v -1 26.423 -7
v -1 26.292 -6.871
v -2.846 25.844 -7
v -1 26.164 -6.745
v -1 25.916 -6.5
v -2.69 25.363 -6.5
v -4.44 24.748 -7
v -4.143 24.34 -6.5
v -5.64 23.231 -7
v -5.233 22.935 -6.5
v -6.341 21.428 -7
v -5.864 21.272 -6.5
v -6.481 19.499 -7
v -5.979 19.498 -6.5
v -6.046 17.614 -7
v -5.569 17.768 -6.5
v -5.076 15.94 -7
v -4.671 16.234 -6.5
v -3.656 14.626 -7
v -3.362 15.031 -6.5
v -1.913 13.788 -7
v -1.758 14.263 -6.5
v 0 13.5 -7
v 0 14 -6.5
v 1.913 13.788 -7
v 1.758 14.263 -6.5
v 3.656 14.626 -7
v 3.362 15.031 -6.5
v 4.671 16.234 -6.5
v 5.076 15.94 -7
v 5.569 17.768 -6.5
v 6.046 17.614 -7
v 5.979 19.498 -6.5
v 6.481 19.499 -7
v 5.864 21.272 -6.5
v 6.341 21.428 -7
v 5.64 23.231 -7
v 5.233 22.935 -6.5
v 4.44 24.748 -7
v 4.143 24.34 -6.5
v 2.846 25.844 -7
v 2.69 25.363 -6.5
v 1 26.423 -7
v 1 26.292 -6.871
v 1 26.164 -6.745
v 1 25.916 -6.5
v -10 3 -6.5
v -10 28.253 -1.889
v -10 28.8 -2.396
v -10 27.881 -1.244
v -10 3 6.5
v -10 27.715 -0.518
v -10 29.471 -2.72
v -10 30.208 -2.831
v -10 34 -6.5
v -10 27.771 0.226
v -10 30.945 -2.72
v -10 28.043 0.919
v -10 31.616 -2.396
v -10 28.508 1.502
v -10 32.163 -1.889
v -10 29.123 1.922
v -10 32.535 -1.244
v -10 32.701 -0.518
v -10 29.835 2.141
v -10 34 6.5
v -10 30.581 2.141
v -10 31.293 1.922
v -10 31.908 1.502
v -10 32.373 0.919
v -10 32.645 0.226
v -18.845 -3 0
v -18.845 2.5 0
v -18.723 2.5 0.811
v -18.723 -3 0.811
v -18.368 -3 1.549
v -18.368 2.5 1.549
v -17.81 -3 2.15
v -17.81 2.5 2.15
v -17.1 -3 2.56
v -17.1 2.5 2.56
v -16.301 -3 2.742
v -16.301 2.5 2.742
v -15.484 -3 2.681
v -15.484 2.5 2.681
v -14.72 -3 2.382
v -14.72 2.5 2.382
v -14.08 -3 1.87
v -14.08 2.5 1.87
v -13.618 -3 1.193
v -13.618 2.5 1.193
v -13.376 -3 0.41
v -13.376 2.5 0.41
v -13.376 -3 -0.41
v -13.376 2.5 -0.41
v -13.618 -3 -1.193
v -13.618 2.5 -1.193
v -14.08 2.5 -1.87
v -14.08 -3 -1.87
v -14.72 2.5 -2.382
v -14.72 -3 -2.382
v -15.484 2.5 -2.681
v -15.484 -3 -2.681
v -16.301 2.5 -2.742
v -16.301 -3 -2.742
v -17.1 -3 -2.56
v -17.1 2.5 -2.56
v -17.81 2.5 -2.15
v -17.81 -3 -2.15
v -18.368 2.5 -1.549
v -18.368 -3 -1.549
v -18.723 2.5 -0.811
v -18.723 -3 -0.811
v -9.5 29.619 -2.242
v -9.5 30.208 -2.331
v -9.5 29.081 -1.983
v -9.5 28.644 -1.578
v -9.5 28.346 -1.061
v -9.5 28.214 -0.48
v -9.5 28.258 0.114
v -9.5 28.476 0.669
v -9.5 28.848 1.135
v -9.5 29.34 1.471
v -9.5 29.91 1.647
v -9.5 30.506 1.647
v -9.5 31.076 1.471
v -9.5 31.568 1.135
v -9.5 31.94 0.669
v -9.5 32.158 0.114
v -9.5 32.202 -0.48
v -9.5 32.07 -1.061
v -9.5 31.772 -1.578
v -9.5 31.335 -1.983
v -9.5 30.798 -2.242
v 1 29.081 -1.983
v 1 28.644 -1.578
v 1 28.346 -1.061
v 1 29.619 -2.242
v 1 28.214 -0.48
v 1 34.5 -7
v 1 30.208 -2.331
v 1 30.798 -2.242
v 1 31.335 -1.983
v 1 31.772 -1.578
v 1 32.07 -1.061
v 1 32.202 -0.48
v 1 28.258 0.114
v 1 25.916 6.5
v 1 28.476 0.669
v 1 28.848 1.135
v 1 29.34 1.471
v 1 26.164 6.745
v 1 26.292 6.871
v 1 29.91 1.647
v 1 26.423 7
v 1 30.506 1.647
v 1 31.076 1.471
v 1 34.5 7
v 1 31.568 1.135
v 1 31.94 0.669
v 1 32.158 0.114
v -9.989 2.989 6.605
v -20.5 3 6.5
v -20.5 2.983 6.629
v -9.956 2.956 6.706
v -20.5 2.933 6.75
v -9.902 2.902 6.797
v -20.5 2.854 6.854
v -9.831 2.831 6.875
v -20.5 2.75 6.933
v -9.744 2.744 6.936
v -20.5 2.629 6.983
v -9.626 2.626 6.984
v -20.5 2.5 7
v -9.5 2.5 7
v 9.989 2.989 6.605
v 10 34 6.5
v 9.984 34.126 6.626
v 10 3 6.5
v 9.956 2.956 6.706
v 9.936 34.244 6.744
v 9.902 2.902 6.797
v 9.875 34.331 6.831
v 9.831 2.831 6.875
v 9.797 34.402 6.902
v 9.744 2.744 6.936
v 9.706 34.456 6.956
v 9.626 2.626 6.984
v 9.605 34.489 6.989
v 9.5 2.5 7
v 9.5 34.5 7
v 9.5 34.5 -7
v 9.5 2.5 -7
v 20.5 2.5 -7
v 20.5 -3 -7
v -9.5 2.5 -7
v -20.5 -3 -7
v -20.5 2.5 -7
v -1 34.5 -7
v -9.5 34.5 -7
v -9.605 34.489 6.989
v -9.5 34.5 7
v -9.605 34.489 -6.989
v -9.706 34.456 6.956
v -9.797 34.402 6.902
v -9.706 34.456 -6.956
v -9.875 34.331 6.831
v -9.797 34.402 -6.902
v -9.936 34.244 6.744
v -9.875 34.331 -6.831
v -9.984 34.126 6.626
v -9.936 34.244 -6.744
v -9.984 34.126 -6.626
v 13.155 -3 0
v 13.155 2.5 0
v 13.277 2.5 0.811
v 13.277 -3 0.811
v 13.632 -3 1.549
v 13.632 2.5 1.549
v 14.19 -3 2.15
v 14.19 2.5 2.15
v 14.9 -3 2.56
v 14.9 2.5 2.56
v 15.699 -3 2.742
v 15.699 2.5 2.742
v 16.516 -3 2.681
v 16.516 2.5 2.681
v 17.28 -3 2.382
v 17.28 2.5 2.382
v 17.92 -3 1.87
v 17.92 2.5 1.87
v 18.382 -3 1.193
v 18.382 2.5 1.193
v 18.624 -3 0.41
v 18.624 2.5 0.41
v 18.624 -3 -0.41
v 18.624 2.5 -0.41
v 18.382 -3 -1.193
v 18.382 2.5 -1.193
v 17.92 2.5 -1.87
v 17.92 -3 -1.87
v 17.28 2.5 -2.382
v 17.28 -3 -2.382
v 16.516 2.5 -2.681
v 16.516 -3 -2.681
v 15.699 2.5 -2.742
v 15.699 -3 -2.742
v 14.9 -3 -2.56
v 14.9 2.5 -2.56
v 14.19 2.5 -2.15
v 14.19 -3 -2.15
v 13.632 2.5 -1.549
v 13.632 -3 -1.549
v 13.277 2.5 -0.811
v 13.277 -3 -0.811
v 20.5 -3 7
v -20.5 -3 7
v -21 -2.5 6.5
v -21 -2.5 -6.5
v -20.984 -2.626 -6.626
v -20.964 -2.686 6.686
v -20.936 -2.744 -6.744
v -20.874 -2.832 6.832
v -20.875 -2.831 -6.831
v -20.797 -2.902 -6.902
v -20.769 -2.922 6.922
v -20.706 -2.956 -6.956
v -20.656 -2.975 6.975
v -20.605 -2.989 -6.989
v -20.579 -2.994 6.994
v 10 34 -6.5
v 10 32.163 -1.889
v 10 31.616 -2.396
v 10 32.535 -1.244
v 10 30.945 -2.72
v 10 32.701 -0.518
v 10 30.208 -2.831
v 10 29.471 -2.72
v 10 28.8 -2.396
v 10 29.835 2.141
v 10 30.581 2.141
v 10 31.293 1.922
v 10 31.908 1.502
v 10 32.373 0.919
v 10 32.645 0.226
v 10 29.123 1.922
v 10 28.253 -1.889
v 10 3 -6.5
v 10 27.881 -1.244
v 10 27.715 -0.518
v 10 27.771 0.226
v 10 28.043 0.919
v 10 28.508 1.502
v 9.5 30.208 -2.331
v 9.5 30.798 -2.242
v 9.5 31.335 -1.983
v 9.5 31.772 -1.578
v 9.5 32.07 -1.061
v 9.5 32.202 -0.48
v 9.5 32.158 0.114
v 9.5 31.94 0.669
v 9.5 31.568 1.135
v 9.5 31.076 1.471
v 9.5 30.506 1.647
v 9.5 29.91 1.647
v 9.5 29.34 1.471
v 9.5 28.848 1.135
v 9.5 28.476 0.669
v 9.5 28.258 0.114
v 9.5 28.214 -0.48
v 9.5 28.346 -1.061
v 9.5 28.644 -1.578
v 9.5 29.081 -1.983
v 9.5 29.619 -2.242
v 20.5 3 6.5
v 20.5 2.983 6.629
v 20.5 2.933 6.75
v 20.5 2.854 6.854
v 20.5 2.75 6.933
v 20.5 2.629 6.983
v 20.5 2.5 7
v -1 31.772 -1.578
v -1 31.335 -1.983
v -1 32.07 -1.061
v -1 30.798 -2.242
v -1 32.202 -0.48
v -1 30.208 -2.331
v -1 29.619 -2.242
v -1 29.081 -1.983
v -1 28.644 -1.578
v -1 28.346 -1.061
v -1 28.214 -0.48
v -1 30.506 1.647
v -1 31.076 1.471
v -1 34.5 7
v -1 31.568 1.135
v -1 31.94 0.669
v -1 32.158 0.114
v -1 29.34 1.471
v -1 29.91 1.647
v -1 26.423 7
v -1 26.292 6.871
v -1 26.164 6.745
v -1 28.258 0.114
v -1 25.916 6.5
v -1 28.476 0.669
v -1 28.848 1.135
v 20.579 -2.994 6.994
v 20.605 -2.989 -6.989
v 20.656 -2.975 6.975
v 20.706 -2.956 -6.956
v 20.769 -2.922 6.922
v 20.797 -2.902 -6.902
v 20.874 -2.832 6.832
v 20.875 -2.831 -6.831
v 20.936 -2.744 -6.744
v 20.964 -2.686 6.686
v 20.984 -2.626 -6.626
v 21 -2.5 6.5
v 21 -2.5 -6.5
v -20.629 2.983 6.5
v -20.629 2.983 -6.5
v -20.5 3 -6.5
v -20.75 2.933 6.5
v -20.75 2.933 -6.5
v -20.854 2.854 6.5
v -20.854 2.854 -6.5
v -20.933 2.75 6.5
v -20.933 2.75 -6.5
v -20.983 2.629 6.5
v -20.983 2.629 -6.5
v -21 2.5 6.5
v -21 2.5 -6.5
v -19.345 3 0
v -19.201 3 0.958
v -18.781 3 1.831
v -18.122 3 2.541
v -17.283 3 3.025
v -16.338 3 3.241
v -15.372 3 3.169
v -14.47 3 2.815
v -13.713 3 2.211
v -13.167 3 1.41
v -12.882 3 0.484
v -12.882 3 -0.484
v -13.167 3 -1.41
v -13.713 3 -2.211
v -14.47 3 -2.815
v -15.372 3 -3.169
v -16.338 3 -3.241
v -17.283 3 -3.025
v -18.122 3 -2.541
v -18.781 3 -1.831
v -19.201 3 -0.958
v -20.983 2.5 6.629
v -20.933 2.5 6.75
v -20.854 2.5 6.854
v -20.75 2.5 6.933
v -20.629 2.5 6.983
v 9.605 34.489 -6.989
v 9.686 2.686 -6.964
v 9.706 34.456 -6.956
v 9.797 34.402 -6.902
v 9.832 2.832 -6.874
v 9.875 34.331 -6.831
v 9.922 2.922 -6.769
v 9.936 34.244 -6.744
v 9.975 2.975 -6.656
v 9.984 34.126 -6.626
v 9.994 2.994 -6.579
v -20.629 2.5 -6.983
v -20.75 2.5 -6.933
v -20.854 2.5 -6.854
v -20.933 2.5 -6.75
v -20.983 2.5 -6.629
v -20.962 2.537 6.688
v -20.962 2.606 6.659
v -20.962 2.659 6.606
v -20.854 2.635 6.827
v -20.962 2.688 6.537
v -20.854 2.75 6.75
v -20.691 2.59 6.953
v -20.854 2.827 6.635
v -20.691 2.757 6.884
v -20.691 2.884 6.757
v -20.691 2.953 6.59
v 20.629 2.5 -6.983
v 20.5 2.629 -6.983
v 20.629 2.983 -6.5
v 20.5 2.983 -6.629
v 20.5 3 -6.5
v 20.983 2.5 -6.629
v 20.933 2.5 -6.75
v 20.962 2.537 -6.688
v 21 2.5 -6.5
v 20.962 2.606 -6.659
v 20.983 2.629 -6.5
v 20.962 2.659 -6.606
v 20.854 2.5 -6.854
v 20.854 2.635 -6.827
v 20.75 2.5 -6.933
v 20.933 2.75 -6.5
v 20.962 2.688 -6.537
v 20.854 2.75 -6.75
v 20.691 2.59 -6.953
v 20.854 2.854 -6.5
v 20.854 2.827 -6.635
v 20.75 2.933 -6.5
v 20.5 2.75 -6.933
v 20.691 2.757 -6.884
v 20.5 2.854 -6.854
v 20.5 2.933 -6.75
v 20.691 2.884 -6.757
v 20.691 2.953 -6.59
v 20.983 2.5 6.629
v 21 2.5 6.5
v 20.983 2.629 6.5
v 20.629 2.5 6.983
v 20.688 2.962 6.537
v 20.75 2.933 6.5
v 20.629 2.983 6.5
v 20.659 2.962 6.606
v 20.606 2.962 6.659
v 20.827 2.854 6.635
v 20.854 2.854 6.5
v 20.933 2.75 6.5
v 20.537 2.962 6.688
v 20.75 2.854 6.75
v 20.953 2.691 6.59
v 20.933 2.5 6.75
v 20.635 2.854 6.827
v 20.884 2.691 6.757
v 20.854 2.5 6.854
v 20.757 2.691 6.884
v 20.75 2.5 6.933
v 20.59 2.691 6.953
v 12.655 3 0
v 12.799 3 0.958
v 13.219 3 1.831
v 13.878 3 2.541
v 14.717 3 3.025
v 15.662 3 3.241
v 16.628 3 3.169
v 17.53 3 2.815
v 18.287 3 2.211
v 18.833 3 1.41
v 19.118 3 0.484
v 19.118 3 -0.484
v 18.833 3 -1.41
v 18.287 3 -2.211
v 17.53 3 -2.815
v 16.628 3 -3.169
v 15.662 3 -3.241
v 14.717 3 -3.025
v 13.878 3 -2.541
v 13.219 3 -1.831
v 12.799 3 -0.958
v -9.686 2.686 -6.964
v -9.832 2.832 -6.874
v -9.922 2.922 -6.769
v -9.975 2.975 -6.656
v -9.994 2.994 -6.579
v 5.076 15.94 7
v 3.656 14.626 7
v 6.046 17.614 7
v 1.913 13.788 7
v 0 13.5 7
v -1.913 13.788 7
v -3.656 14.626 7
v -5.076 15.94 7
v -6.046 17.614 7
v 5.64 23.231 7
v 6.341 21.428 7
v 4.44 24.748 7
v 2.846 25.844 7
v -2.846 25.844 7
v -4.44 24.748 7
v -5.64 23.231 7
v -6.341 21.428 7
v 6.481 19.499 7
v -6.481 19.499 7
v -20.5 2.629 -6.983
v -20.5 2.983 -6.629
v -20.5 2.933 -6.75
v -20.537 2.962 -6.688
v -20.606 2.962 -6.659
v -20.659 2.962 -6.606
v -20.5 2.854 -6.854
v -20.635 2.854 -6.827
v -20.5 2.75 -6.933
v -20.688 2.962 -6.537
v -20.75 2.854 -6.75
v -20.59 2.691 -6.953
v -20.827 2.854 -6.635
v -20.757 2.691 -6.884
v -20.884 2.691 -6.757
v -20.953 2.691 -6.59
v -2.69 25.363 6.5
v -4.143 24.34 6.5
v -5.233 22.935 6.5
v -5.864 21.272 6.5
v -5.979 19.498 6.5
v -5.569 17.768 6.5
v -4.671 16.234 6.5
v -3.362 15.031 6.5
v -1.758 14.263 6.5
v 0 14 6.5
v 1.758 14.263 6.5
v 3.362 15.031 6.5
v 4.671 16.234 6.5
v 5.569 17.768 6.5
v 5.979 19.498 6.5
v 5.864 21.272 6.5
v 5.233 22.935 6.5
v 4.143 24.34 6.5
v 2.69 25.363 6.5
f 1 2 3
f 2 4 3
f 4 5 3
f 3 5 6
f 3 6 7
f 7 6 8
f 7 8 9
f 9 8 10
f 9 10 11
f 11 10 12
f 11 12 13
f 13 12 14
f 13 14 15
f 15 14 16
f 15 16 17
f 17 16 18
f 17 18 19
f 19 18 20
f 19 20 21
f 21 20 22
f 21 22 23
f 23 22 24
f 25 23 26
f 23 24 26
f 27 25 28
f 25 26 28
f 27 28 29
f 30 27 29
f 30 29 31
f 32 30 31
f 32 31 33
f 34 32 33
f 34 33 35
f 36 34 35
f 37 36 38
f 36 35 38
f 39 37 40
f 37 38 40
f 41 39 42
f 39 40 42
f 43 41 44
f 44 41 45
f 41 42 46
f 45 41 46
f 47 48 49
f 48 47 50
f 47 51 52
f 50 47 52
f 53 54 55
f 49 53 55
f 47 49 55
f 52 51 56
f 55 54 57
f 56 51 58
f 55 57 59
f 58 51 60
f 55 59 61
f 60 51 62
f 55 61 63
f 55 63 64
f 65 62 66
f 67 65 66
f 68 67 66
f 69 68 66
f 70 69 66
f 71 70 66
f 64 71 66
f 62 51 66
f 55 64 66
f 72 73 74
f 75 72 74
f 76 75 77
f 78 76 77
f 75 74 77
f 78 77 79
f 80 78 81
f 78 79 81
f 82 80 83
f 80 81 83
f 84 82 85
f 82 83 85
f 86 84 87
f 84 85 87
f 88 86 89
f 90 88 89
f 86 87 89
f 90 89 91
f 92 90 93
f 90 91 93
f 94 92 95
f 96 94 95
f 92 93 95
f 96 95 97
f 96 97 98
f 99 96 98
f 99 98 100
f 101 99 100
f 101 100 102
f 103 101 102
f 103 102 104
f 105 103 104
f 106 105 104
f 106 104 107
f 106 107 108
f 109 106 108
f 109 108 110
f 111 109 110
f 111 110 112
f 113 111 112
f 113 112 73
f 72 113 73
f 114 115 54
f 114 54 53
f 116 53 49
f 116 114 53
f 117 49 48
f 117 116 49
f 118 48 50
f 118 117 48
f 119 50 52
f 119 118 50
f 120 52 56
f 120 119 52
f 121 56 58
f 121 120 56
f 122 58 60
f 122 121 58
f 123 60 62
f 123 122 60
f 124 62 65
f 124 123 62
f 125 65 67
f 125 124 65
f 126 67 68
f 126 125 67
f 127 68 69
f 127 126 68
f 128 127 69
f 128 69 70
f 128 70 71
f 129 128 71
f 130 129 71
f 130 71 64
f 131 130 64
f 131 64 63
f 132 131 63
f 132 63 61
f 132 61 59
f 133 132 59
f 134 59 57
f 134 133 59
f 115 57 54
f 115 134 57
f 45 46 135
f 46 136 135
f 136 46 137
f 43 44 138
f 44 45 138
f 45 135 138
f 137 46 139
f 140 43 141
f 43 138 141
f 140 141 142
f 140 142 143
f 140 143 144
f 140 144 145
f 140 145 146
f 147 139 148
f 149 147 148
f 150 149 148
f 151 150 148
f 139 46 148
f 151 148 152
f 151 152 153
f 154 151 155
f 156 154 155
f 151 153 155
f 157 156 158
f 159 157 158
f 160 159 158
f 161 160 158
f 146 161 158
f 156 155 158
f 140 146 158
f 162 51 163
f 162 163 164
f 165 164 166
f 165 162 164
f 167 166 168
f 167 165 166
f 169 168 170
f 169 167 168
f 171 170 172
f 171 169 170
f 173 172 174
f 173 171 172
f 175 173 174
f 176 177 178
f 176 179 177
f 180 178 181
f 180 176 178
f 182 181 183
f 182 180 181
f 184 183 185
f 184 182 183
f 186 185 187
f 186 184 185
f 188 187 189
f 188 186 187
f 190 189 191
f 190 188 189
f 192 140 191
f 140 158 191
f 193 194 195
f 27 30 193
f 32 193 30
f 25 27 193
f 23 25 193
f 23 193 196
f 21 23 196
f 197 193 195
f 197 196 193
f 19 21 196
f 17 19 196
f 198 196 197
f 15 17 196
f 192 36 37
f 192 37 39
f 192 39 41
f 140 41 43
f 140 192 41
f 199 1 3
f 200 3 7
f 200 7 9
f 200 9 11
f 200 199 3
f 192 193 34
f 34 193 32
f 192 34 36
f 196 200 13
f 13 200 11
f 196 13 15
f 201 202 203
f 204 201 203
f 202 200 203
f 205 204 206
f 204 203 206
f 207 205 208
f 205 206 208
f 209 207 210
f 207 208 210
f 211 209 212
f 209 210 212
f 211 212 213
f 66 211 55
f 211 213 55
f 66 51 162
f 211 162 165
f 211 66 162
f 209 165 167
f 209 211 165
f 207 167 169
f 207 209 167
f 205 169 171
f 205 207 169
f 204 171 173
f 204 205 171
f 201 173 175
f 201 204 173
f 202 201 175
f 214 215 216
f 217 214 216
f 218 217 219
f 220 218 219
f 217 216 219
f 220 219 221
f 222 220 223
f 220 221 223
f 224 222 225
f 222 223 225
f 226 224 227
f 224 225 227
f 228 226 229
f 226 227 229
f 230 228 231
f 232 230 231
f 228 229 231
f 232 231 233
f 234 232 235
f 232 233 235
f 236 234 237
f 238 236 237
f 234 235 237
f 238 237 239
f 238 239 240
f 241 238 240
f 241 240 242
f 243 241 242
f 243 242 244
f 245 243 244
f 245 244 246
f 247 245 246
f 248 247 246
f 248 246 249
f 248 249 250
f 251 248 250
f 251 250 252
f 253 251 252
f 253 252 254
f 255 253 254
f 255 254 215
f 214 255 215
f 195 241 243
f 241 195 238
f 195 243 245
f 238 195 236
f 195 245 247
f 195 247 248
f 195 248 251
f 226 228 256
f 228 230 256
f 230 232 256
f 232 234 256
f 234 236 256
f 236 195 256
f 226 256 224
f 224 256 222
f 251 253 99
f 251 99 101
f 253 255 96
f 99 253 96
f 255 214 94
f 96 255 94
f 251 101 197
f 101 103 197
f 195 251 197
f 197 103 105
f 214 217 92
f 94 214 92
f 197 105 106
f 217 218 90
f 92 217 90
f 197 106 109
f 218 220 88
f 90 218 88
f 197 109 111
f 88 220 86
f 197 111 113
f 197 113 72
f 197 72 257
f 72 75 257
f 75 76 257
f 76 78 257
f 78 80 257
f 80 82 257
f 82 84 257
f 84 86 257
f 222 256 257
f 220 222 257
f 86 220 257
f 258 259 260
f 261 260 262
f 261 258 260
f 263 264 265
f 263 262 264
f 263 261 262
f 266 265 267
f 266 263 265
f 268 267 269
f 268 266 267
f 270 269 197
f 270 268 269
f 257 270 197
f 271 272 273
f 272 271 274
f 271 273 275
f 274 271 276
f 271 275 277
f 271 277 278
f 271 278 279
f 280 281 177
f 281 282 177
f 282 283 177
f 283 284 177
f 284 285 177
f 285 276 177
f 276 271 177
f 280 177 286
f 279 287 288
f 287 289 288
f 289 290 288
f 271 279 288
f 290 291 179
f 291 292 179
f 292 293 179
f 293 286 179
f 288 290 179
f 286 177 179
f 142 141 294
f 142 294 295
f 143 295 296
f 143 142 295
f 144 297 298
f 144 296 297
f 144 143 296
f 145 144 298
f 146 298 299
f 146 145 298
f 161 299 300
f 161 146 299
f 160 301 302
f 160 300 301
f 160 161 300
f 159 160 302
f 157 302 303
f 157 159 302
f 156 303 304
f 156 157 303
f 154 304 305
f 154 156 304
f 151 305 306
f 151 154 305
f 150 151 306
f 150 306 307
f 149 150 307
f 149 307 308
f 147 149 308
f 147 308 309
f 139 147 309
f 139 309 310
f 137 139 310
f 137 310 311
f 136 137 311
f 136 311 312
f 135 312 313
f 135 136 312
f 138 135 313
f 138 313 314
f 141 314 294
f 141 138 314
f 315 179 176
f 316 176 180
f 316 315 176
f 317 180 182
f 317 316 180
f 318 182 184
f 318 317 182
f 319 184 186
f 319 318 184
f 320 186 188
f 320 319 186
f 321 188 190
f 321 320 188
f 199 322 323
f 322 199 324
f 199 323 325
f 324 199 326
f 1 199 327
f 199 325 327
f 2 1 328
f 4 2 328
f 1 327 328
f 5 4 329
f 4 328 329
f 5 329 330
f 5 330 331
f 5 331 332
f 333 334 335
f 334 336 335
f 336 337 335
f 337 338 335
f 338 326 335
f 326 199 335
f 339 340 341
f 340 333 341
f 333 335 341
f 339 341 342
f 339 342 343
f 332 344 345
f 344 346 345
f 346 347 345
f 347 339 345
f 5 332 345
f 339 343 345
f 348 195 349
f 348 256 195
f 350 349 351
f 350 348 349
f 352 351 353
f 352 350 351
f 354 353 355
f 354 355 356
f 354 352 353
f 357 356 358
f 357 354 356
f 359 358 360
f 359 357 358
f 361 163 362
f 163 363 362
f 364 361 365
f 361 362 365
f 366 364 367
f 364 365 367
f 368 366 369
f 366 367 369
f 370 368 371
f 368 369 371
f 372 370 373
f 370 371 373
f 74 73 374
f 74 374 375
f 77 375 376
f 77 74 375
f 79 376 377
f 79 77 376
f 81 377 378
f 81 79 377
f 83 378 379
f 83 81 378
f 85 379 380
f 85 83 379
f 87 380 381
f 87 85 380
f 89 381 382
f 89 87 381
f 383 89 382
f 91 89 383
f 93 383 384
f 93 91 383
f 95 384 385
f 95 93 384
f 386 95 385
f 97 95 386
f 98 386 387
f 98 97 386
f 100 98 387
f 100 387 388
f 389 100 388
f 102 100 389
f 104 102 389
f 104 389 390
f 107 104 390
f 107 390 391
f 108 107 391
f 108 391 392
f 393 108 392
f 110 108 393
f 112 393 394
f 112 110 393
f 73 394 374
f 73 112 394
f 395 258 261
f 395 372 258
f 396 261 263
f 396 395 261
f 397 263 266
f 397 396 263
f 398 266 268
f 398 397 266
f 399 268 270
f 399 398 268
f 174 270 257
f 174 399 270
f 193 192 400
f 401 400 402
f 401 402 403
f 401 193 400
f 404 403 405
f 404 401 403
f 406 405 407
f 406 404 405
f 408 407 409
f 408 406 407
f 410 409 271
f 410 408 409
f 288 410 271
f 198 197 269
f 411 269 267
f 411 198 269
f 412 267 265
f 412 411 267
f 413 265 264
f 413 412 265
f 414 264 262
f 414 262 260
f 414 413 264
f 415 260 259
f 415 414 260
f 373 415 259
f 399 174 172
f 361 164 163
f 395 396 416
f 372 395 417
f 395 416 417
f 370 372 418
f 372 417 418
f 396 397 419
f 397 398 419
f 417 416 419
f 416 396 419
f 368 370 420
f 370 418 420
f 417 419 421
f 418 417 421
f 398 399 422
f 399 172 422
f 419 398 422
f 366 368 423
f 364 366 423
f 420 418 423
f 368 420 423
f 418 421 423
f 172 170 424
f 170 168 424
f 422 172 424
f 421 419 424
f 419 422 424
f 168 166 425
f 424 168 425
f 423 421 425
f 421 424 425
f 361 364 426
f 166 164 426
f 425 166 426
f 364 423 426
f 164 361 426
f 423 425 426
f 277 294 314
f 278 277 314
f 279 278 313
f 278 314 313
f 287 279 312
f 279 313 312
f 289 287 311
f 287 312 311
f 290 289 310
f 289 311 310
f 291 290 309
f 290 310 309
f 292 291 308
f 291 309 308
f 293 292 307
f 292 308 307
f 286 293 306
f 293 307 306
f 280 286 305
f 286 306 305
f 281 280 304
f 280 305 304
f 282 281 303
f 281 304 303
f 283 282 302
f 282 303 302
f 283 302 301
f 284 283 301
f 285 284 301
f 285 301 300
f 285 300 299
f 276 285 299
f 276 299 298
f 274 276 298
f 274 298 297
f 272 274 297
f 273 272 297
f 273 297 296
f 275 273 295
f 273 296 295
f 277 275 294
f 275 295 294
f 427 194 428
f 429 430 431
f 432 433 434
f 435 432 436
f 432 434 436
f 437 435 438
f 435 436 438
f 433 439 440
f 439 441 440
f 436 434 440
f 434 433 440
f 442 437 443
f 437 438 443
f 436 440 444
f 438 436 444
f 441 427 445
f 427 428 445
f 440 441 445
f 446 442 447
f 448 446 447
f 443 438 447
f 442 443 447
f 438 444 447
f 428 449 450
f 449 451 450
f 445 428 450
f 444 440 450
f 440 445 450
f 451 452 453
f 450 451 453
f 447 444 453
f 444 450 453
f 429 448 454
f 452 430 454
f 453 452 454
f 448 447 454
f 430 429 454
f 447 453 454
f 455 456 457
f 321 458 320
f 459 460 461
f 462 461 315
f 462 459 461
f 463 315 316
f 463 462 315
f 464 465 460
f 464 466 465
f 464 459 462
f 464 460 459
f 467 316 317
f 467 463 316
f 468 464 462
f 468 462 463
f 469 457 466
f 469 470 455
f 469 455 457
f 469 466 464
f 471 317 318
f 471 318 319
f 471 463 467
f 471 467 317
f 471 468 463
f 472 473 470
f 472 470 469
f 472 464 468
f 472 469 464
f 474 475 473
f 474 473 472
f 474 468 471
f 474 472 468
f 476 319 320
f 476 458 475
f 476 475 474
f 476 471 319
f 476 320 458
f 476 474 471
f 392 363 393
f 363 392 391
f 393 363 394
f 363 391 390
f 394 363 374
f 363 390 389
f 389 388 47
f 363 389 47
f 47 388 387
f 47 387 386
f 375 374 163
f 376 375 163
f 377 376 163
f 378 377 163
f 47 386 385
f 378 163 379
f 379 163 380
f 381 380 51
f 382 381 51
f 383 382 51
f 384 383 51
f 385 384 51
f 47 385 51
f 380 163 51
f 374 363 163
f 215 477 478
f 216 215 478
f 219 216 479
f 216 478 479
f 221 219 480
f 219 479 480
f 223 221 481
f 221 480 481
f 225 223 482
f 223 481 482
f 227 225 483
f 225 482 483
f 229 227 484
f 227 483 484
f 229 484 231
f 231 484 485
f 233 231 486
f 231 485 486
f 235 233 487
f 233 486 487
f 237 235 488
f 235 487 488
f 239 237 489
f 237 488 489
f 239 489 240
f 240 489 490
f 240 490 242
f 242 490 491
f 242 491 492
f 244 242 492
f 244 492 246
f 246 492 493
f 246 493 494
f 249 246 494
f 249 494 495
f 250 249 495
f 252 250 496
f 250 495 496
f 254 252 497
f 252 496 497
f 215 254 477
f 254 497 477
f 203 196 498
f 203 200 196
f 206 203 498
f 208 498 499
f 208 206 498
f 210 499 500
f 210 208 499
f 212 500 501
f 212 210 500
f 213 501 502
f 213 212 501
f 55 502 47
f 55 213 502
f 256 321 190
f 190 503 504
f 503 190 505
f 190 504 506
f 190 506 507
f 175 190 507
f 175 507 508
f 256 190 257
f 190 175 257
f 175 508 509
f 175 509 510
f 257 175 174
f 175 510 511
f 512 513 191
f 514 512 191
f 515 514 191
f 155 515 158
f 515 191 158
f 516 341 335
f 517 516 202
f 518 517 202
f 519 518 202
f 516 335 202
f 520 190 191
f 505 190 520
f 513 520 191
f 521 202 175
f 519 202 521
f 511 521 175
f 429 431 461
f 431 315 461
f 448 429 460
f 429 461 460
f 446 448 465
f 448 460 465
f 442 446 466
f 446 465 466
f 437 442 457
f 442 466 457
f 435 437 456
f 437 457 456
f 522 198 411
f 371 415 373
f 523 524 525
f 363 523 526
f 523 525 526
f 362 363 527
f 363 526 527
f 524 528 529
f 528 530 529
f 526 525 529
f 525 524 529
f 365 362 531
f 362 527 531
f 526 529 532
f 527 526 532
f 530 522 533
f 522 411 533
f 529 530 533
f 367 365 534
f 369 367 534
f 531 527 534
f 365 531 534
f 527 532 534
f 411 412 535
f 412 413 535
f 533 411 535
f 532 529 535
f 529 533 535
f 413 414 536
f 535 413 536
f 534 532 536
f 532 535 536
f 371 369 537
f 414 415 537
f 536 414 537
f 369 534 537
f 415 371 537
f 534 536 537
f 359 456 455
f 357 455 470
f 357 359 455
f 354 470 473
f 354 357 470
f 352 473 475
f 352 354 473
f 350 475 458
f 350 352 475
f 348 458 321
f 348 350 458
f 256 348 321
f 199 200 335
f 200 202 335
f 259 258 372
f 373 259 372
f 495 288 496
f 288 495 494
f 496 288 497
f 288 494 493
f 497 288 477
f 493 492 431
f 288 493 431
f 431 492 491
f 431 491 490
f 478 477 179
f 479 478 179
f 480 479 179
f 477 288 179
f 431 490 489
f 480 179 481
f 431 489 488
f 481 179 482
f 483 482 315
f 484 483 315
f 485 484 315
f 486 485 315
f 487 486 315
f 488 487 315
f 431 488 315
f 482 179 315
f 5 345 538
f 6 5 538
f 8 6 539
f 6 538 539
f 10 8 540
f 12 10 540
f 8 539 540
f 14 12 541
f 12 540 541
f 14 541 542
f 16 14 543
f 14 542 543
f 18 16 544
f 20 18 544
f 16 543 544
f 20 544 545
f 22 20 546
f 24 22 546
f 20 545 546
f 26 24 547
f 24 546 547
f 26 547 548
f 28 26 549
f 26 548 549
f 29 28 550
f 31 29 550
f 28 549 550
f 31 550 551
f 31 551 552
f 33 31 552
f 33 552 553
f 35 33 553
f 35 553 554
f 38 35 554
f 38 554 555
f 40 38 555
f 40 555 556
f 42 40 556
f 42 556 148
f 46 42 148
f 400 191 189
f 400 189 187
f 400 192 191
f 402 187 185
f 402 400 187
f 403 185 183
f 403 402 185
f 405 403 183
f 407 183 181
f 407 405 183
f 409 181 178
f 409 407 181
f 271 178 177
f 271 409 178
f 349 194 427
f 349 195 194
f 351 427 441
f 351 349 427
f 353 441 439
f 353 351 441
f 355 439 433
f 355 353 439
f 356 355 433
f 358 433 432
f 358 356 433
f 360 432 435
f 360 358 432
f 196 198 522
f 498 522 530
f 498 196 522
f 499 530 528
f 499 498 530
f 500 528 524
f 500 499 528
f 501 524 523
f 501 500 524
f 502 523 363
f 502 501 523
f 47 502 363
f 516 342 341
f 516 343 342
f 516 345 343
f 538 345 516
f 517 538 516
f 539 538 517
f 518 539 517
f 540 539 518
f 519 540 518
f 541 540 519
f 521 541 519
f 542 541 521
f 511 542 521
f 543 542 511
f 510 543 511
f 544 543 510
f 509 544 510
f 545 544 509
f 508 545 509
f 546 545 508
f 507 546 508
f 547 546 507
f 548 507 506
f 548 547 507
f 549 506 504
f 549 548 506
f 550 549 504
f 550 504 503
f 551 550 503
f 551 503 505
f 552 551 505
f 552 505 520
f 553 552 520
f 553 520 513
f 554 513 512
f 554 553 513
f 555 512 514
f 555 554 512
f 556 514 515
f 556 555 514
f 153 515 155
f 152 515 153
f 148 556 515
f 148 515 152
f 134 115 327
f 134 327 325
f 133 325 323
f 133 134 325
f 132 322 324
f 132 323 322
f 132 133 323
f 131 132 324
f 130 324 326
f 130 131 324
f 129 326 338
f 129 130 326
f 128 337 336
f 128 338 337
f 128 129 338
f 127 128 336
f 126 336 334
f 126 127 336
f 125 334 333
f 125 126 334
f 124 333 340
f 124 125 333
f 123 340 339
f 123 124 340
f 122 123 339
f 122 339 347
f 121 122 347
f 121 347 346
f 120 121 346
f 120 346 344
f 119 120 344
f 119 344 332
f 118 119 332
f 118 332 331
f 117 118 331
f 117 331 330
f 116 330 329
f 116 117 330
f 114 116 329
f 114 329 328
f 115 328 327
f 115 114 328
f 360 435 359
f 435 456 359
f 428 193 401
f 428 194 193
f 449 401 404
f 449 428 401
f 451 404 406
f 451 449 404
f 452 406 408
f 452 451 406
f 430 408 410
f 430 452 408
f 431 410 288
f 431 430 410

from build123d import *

# Parameters (mm, degrees)
BOSS_EXTRUDE1_DEPTH     = 7
SKETCH2_R               = 2.75
CUT_EXTRUDE1_DEPTH      = 39.5
CUT_EXTRUDE2_DEPTH      = 42.512046444
CUT_EXTRUDE2_DEPTH_BACK = 42.512046444
SKETCH5_R               = 2
CHAMFER2_SIZE           = 0.5
FILLET2_R               = 0.5


with BuildPart() as part:
    # Sketch1 → Boss-Extrude1 (new, symmetric)
    with BuildSketch(Plane.XY):
        with BuildLine():
            Line((-21, -3), (-21, 3))
            Line((-21, 3), (-10, 3))
            Line((-10, 3), (-10, 34.5))
            Line((-10, 34.5), (-1, 34.5))
            Line((-1, 34.5), (-1, 25.916079783))
            ThreePointArc((-1, 25.916079783), (0, 14), (1, 25.916079783))
            Line((1, 25.916079783), (1, 34.5))
            Line((1, 34.5), (10, 34.5))
            Line((10, 34.5), (10, 3))
            Line((10, 3), (21, 3))
            Line((21, 3), (21, -3))
            Line((21, -3), (-21, -3))
        make_face()
    extrude(amount=BOSS_EXTRUDE1_DEPTH, both=True)

    # Sketch2 → Cut-Extrude1 (cut, through all)
    with BuildSketch(Plane(origin=(0, 3, 0), x_dir=(1, 0, 0), z_dir=(0, 1, 0))):
        with Locations(Location((15.904501915, 0, 0), (0, 0, 180))):
            Circle(SKETCH2_R)
        with Locations(Location((-16.095498085, 0, 0), (0, 0, 180))):
            Circle(SKETCH2_R)
    extrude(amount=-CUT_EXTRUDE1_DEPTH, mode=Mode.SUBTRACT)

    # Sketch5 → Cut-Extrude2 (cut, two sides: drawn at the far end of the back side and taken through both)
    with BuildSketch(Plane(origin=(-1, 0, 0), x_dir=(0, 0, -1), z_dir=(1, 0, 0)).offset(-CUT_EXTRUDE2_DEPTH_BACK)):
        with Locations((0.330734984, 30.208039892)):
            Circle(SKETCH5_R)
    extrude(amount=CUT_EXTRUDE2_DEPTH + CUT_EXTRUDE2_DEPTH_BACK, mode=Mode.SUBTRACT)

    # Chamfer2
    chamfer2_edges = [part.edges().sort_by_distance(p)[0] for p in [
        (0, 14, -7),
        (0, 14, 7),
        (18.654501915, 3, 0),
        (-13.345498085, 3, 0),
        (-10, 30.208039892, 1.669265016),
        (10, 30.208039892, 1.669265016),
    ]]
    chamfer(chamfer2_edges, length=CHAMFER2_SIZE)

    # Fillet2
    fillet2_edges = [part.edges().sort_by_distance(p)[0] for p in [
        (-15.5, 3, 7),
        (10, 18.75, -7),
        (15.5, 3, -7),
        (-21, 0, 7),
        (21, 0, -7),
        (-21, 0, -7),
        (-15.5, 3, -7),
        (-10, 18.75, -7),
        (21, 0, 7),
        (10, 34.5, 0),
        (21, 3, 0),
        (21, -3, 0),
        (-21, -3, 0),
        (-21, 3, 0),
        (-10, 34.5, 0),
        (15.5, 3, 7),
        (10, 18.75, 7),
        (-10, 18.75, 7),
    ]]
    fillet(fillet2_edges, radius=FILLET2_R)


solid = part.part
